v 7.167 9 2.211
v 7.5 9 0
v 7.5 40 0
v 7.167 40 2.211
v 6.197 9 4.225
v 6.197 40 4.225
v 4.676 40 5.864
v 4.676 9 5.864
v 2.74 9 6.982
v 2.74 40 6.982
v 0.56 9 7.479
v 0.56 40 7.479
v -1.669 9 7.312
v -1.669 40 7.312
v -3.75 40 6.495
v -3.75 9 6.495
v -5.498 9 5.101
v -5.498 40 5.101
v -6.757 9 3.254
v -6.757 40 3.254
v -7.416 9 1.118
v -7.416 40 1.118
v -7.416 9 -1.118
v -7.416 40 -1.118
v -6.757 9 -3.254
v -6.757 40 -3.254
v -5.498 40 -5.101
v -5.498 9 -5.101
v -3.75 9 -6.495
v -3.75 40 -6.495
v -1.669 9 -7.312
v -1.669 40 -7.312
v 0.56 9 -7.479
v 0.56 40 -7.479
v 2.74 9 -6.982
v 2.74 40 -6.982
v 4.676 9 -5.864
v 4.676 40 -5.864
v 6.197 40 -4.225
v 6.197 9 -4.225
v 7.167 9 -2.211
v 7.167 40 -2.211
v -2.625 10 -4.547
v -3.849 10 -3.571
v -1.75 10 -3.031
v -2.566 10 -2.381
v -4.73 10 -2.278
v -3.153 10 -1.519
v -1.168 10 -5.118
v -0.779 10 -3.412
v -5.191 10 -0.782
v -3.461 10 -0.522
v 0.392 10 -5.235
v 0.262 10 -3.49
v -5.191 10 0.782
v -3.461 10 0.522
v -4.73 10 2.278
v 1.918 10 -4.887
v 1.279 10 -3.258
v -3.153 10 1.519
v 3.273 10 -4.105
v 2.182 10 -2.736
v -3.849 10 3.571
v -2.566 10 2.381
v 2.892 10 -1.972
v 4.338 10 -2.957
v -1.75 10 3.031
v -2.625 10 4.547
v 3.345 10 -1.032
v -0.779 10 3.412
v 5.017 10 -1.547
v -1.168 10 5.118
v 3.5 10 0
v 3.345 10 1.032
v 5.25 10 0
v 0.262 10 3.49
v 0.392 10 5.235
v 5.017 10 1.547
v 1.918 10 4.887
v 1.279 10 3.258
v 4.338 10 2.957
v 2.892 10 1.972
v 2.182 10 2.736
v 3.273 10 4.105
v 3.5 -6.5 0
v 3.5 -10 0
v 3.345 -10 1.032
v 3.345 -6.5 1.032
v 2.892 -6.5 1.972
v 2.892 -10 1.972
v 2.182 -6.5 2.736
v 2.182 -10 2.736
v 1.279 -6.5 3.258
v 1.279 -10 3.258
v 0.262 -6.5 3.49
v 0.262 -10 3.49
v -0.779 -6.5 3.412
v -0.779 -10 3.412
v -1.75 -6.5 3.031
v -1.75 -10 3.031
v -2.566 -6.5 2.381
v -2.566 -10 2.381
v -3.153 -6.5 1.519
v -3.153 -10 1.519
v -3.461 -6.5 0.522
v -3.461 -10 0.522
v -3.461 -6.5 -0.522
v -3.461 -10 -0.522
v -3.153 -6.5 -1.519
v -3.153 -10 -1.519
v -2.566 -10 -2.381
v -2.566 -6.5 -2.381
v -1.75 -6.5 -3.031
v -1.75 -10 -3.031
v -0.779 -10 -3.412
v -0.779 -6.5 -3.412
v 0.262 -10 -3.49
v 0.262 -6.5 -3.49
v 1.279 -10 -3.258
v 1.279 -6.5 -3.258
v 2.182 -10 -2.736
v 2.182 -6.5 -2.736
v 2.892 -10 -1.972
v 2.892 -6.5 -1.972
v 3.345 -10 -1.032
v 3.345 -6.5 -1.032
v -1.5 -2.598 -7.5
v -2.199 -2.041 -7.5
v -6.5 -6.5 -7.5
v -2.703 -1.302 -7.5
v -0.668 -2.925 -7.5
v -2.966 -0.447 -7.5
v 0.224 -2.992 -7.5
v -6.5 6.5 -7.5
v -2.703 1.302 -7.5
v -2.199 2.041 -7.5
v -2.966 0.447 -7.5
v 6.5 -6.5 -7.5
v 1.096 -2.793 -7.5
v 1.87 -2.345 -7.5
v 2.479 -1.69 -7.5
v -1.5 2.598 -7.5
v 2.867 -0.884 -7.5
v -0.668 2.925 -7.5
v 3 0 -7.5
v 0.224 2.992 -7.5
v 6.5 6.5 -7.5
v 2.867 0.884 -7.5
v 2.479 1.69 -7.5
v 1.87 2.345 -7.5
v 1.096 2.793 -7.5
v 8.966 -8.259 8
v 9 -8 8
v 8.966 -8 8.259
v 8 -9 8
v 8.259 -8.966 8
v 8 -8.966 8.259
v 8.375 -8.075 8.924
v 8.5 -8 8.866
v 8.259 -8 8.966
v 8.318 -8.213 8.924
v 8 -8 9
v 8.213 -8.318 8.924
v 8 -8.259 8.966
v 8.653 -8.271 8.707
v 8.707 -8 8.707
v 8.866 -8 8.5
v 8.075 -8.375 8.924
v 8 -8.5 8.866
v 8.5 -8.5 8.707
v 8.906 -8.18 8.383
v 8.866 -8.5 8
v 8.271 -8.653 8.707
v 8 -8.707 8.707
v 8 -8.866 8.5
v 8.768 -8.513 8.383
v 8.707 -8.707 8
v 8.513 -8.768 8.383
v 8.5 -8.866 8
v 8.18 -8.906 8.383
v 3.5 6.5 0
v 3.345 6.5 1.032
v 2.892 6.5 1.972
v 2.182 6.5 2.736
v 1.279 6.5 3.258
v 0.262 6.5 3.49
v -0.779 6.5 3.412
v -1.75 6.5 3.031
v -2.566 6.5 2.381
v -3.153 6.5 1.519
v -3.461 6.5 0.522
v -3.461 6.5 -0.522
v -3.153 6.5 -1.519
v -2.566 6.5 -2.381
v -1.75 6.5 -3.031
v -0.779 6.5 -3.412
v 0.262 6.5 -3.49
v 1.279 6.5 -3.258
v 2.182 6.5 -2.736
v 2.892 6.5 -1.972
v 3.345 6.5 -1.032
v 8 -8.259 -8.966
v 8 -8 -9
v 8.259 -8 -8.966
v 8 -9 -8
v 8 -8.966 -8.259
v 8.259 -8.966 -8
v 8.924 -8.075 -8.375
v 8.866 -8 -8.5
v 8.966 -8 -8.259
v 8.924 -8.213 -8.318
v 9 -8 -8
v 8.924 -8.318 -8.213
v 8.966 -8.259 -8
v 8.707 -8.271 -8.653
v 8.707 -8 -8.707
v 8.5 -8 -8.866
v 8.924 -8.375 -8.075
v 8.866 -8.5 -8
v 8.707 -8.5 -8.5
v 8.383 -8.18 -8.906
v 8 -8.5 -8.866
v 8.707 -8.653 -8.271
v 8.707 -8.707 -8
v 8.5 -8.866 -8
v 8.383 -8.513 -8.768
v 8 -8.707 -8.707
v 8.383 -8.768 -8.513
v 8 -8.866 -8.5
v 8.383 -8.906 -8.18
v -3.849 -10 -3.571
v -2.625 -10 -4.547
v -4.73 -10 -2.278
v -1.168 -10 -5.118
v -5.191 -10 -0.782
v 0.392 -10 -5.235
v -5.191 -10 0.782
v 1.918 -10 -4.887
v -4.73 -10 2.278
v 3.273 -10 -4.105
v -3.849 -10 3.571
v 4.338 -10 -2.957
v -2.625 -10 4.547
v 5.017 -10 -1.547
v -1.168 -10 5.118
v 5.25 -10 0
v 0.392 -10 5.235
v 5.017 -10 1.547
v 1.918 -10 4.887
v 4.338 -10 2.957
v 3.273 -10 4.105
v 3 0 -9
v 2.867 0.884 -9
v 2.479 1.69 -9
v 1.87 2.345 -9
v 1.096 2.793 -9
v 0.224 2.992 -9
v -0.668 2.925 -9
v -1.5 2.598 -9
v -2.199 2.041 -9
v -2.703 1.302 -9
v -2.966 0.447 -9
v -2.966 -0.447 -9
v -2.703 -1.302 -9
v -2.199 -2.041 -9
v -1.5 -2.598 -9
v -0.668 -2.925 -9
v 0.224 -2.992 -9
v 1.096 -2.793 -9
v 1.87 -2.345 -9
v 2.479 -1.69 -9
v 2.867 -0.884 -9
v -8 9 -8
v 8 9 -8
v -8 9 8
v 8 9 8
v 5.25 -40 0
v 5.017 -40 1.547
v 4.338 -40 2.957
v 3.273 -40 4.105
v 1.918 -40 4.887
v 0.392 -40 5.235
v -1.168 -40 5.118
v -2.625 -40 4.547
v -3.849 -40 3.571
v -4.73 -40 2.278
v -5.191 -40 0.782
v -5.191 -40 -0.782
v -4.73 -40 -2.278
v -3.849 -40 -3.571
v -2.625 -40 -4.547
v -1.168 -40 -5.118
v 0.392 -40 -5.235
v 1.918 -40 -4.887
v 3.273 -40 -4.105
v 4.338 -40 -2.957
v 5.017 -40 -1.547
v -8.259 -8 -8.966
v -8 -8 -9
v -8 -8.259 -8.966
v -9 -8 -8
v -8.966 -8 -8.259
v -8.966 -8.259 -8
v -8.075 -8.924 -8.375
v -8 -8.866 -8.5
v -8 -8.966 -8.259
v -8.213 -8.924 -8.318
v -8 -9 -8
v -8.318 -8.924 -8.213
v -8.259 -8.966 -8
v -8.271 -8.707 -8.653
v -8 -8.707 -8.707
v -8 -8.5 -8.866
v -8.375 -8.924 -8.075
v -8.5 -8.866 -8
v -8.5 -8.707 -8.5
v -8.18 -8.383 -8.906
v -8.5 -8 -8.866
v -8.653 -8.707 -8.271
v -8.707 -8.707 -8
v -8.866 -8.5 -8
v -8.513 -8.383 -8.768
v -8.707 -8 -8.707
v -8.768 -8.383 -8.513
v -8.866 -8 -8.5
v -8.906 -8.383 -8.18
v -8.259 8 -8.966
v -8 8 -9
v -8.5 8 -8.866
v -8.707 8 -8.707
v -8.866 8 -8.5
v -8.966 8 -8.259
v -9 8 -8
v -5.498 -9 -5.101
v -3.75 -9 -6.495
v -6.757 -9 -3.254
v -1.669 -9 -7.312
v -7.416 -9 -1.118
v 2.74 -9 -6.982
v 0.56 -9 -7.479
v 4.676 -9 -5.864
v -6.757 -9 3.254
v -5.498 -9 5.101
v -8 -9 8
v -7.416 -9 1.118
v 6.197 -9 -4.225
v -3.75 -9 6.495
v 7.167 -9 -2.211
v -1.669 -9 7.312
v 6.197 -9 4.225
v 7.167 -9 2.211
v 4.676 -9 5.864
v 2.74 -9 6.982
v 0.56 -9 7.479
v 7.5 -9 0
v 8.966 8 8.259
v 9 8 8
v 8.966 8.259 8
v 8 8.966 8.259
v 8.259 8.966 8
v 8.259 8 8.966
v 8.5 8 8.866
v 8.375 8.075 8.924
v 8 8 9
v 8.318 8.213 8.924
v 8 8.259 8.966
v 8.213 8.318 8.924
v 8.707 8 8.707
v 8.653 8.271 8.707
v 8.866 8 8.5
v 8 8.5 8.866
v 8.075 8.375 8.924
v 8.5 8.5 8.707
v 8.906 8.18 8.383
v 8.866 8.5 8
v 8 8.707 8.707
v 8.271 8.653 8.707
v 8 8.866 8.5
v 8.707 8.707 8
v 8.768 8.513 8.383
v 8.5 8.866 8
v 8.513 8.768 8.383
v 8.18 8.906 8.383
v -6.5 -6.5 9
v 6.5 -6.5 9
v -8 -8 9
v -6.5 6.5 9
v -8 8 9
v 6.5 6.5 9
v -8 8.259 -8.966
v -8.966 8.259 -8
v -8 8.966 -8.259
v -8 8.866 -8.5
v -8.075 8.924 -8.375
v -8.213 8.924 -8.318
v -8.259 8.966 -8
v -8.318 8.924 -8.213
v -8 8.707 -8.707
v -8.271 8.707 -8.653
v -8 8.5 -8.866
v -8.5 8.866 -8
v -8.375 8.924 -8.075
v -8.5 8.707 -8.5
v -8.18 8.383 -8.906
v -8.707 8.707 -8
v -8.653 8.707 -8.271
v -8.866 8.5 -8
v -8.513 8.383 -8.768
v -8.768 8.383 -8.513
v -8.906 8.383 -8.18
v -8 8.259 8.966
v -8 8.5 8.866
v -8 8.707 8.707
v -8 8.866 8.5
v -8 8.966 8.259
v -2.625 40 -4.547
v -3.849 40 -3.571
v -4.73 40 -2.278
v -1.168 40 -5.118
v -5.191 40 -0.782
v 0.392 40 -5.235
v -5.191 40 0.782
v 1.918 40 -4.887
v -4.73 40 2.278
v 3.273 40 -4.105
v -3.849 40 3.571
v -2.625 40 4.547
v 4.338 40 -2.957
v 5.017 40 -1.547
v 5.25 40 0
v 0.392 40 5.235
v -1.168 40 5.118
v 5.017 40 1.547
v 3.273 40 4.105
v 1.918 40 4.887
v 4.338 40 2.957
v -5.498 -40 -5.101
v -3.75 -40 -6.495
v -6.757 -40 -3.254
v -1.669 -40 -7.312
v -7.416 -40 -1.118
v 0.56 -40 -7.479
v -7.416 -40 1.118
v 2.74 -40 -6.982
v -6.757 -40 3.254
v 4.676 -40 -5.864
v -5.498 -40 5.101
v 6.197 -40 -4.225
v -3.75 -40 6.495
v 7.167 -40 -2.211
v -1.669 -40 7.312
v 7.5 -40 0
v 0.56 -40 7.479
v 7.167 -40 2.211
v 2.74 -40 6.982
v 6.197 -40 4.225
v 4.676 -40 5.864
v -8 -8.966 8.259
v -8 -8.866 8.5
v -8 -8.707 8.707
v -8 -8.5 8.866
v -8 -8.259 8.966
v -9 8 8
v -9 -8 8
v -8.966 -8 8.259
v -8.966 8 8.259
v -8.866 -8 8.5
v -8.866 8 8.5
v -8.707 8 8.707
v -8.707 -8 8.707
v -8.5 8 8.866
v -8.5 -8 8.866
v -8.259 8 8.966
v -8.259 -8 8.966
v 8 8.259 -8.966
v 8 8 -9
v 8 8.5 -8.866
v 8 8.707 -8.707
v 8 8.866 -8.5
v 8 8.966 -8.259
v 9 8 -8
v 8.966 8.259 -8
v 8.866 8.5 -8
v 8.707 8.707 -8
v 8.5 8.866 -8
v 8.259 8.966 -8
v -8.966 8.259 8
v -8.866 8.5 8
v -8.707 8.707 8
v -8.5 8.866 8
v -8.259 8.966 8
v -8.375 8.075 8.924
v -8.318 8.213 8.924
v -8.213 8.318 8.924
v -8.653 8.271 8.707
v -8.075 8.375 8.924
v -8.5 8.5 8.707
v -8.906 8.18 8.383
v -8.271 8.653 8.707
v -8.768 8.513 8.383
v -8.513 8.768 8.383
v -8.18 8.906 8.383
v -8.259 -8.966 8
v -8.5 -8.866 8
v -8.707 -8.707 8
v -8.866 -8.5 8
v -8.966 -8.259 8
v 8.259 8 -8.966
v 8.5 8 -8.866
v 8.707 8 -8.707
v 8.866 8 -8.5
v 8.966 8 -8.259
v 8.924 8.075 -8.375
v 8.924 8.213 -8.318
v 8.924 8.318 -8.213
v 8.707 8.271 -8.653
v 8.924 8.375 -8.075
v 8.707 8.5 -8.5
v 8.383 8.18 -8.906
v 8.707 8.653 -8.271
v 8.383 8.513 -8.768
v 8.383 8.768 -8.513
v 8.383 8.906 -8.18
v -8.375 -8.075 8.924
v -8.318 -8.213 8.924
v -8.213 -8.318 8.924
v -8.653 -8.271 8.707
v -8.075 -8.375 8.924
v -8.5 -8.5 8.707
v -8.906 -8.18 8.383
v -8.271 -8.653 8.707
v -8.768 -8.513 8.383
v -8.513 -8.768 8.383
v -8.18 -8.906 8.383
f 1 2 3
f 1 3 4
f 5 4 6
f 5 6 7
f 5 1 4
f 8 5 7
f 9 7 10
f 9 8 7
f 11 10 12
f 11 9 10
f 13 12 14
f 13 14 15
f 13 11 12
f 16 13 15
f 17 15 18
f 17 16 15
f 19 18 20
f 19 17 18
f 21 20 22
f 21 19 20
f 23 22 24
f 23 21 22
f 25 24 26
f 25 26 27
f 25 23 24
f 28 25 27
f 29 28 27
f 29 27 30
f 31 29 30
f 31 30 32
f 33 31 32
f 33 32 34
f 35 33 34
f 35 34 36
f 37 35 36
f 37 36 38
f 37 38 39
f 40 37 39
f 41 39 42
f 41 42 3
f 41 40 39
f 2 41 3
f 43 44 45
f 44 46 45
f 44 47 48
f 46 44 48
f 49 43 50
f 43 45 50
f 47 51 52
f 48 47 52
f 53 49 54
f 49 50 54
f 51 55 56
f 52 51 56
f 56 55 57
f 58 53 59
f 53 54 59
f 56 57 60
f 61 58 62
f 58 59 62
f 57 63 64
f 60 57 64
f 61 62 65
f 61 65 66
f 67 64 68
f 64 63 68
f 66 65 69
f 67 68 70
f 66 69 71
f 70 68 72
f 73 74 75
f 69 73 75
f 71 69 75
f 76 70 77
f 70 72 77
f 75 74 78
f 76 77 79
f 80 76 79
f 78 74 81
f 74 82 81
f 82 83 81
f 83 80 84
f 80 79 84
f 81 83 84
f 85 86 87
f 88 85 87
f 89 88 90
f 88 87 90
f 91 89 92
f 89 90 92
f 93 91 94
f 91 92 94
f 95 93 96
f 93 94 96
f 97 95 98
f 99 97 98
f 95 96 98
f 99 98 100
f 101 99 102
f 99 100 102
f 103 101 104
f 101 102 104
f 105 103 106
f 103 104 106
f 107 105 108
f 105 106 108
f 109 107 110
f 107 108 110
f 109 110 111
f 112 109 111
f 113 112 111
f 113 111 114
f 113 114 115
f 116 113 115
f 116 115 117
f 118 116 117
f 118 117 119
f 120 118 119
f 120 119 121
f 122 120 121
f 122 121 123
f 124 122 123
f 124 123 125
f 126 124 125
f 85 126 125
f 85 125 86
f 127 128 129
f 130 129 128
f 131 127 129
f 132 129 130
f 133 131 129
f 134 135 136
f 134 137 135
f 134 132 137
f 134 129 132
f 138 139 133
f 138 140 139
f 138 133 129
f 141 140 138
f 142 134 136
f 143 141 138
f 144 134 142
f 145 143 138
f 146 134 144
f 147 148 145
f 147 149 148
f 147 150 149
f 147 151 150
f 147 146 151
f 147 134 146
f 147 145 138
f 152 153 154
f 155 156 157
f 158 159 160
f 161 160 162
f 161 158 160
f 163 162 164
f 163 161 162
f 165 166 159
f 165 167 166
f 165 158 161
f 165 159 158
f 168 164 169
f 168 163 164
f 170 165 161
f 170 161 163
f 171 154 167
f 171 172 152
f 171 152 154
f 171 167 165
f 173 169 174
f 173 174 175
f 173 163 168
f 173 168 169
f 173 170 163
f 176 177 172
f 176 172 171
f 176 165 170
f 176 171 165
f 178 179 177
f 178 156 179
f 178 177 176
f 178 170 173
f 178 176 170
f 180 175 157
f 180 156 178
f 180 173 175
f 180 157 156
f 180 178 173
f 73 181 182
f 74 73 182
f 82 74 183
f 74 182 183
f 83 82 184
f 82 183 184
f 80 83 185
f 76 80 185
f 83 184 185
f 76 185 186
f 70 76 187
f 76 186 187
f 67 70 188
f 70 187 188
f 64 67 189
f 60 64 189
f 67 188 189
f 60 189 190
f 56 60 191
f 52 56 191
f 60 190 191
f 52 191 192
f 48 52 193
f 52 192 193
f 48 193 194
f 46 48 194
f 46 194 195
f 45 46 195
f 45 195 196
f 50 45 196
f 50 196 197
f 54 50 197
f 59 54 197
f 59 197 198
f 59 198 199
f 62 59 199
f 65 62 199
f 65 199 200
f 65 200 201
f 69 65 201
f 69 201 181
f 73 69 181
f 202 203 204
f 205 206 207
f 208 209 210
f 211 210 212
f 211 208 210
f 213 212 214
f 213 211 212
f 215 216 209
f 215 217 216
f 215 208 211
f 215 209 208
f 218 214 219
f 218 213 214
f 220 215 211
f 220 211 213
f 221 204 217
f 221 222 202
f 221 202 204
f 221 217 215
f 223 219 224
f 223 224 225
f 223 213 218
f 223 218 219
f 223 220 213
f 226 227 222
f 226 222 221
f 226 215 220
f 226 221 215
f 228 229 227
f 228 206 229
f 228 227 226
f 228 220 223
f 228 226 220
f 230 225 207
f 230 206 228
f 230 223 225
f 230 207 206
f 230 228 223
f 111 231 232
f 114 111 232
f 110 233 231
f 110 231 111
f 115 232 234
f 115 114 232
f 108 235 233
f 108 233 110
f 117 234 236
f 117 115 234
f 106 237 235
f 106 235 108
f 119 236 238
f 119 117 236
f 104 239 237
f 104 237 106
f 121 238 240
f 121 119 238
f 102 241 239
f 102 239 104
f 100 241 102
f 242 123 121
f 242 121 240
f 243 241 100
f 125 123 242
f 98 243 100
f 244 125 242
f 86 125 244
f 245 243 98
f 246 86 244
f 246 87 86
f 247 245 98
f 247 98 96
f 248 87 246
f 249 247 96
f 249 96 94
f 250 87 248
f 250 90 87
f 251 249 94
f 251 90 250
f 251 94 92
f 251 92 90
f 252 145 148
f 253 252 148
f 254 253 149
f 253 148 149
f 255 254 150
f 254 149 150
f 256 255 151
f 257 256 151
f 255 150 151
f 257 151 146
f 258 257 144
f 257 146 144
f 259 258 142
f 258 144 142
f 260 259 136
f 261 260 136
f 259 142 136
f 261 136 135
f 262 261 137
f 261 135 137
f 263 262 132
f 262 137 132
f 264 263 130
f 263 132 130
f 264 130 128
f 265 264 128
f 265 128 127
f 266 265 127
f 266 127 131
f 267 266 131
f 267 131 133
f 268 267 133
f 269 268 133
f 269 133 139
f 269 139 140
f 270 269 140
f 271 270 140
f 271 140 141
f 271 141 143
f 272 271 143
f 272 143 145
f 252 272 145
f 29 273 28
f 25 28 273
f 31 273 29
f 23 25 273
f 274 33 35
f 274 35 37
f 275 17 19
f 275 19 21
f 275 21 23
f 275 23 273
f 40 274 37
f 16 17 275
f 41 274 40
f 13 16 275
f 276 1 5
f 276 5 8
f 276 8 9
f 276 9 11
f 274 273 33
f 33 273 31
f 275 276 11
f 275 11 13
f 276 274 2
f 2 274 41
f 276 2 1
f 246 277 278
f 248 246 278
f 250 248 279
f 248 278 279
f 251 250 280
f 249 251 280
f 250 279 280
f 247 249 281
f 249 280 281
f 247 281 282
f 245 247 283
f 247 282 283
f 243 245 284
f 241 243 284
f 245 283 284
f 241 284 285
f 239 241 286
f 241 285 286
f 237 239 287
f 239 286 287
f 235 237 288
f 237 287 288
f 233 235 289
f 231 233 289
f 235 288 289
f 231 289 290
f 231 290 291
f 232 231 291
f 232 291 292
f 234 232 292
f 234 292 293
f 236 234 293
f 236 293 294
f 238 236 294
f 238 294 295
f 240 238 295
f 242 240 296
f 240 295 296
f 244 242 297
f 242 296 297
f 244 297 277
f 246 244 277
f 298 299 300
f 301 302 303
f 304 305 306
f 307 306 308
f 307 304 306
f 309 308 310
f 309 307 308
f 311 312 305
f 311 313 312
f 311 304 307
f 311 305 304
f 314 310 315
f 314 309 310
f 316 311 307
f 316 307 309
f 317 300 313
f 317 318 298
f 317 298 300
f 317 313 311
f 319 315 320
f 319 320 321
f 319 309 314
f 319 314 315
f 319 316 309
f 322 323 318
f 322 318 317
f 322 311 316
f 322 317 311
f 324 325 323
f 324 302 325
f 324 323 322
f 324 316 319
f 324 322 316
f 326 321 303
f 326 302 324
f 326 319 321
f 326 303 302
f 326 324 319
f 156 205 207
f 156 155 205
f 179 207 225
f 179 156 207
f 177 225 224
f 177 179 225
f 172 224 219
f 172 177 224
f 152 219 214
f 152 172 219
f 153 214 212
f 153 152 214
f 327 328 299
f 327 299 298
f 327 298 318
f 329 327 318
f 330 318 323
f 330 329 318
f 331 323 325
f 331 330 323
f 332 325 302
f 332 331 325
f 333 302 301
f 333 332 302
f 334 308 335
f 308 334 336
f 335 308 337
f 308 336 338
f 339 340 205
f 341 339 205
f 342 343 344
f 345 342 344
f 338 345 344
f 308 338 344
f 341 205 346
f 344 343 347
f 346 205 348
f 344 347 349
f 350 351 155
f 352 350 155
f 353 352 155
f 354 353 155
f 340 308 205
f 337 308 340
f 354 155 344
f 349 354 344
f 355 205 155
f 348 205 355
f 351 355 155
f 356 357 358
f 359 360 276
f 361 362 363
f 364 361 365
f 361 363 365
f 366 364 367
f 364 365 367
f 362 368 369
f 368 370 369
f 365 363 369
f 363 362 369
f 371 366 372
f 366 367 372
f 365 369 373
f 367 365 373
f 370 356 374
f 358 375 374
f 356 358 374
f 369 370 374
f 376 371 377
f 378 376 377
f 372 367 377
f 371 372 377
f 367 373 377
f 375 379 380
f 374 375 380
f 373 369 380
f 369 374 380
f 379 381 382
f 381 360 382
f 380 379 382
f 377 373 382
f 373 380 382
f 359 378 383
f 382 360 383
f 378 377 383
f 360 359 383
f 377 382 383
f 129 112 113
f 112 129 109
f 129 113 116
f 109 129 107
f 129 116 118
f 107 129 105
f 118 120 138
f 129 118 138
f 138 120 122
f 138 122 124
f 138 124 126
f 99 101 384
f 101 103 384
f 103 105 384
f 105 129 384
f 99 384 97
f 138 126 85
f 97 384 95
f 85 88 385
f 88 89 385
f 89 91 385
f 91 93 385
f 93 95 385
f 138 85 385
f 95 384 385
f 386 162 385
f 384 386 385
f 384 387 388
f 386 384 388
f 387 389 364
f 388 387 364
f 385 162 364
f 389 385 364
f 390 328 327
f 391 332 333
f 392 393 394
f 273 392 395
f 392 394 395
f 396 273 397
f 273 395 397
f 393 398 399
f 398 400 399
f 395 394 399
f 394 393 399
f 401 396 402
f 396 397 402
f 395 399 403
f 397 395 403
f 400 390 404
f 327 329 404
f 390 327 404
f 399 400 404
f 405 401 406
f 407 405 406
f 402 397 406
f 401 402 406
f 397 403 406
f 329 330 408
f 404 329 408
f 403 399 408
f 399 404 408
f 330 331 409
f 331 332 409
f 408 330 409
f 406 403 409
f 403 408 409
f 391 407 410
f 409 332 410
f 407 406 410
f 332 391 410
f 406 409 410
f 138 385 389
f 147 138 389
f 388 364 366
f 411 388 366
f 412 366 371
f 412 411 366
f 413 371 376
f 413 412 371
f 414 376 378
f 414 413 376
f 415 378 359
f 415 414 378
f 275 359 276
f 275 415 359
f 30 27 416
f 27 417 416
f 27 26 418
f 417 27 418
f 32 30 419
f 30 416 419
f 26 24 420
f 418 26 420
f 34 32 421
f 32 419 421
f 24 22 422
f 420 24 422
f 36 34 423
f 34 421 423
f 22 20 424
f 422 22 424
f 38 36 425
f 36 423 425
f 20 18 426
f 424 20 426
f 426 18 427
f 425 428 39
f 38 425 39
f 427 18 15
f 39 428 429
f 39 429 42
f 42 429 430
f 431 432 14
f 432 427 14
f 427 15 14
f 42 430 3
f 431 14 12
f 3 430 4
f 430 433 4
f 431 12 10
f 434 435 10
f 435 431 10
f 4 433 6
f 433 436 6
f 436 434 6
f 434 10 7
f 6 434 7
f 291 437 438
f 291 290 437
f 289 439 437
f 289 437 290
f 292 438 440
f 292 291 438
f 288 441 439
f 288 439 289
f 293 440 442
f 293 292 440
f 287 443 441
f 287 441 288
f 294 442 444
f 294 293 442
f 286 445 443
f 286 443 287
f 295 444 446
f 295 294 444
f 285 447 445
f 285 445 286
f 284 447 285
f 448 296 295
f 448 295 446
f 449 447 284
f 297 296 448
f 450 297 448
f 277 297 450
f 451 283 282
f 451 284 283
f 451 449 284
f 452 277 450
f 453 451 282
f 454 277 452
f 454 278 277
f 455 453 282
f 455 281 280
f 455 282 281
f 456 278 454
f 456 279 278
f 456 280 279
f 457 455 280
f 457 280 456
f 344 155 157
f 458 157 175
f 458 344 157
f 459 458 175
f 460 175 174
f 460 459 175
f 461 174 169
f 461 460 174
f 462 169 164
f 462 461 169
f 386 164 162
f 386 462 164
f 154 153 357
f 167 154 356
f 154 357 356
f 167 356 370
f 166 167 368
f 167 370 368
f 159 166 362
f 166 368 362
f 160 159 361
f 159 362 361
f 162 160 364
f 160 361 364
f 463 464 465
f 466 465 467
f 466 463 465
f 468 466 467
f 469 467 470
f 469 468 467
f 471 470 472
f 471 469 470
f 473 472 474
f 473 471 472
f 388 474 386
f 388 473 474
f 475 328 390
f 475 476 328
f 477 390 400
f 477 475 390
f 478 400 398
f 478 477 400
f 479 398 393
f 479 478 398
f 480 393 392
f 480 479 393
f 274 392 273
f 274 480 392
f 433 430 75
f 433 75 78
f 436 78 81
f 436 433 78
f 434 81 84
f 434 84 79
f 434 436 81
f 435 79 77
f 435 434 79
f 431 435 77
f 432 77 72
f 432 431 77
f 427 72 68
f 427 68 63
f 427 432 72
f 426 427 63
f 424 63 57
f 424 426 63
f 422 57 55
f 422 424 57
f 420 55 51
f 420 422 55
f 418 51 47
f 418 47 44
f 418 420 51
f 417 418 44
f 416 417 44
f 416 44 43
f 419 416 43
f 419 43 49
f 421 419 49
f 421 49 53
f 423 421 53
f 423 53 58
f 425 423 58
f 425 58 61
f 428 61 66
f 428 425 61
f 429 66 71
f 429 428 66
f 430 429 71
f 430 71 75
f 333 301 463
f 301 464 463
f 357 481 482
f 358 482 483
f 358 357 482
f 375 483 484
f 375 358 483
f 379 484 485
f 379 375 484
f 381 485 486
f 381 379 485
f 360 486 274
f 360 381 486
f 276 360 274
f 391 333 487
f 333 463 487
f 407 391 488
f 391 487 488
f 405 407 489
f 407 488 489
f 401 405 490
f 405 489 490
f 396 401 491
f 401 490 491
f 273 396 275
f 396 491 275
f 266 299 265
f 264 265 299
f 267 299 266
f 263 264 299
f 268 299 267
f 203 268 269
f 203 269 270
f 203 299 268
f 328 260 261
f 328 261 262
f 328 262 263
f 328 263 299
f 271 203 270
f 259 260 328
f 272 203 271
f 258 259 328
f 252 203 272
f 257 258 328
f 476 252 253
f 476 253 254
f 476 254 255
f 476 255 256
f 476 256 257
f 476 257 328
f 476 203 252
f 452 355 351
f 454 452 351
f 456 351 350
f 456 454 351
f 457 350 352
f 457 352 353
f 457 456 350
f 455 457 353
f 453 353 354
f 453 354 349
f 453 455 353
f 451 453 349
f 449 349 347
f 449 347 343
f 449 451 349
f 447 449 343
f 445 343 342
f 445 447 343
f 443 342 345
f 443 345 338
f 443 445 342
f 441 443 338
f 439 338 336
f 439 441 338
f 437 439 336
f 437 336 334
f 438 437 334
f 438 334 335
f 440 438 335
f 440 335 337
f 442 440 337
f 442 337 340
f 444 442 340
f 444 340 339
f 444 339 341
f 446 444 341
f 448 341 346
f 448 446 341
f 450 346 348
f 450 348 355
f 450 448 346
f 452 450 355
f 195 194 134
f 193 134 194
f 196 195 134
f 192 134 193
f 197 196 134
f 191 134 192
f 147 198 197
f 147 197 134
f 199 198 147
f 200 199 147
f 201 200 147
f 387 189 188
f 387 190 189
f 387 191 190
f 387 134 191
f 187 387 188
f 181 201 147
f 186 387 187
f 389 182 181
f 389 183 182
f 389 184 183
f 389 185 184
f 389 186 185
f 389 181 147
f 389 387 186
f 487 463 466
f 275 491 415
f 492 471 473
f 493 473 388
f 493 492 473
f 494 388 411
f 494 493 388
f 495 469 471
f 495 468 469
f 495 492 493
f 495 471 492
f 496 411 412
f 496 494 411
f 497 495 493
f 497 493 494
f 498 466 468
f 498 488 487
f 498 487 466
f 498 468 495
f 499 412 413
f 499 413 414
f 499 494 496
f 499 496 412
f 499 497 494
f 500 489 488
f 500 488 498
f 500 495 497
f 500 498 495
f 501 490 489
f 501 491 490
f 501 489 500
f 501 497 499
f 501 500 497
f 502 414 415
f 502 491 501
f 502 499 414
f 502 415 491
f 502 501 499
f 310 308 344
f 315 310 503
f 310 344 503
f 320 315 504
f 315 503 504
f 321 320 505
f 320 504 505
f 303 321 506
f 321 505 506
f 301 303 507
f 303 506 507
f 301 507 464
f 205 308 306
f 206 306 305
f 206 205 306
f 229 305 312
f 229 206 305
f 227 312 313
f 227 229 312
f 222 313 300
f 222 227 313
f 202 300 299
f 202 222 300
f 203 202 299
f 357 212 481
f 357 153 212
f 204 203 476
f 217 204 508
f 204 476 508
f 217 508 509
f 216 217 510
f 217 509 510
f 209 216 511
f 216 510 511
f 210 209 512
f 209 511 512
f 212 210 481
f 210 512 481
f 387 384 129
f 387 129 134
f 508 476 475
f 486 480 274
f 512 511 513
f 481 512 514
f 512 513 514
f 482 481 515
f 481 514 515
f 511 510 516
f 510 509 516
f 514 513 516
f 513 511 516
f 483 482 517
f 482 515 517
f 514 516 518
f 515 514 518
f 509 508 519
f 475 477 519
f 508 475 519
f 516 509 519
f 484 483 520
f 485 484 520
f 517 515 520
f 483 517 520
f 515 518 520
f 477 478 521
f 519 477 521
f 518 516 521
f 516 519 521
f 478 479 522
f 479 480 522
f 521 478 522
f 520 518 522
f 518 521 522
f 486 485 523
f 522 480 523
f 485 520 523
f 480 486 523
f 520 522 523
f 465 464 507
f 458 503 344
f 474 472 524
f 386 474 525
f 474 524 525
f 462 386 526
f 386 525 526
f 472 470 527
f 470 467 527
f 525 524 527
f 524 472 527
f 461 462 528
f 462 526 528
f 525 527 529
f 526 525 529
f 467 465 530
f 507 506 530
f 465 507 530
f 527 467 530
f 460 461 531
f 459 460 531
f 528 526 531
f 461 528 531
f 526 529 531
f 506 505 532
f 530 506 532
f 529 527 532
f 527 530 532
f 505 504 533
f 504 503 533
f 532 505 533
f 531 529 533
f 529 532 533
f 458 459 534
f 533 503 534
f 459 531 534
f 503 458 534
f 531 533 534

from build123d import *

# Parameters (mm, degrees)
SKETCH_R             = 7.5
PAD_DEPTH            = 40
SKETCH001_R          = 5.25
POCKET_DEPTH         = 30
SKETCH002_R          = 5.25
POCKET001_DEPTH      = 30
SKETCH004_W          = 18
SKETCH004_H          = 18
PAD001_DEPTH         = 9
SKETCH005_R          = 3.5
POCKET002_DEPTH      = 40.001
POCKET002_DEPTH_BACK = 40.001
SKETCH006_R          = 3
POCKET003_DEPTH      = 9.001
POCKET003_DEPTH_BACK = 9.001
SKETCH008_W          = 13
SKETCH008_H          = 13
POCKET004_DEPTH      = 16.5
FILLET_R             = 1


with BuildPart() as part:
    # Sketch → Pad (new body, symmetric)
    with BuildSketch(Plane.XZ):
        Circle(SKETCH_R)
    extrude(amount=PAD_DEPTH, both=True)

    # Sketch001 → Pocket (cut)
    with BuildSketch(Plane.XZ.offset(40)):
        Circle(SKETCH001_R)
    extrude(amount=-POCKET_DEPTH, mode=Mode.SUBTRACT)

    # Sketch002 → Pocket001 (cut)
    with BuildSketch(Plane.XZ.offset(-40)):
        Circle(SKETCH002_R)
    extrude(amount=POCKET001_DEPTH, mode=Mode.SUBTRACT)

    # Sketch004 → Pad001 (join, symmetric)
    with BuildSketch(Plane.YZ):
        Rectangle(SKETCH004_W, SKETCH004_H)
    extrude(amount=PAD001_DEPTH, both=True)

    # Sketch005 → Pocket002 (cut, two sides)
    with BuildSketch(Plane.XZ) as pocket002_sk:
        Circle(SKETCH005_R)
    extrude(amount=-POCKET002_DEPTH, mode=Mode.SUBTRACT)
    extrude(pocket002_sk.sketch, amount=POCKET002_DEPTH_BACK, mode=Mode.SUBTRACT)

    # Sketch006 → Pocket003 (cut, two sides)
    with BuildSketch(Plane.XY) as pocket003_sk:
        Circle(SKETCH006_R)
    extrude(amount=-POCKET003_DEPTH, mode=Mode.SUBTRACT)
    extrude(pocket003_sk.sketch, amount=POCKET003_DEPTH_BACK, mode=Mode.SUBTRACT)

    # Sketch008 → Pocket004 (cut)
    with BuildSketch(Plane.XY.offset(9)):
        Rectangle(SKETCH008_W, SKETCH008_H)
    extrude(amount=-POCKET004_DEPTH, mode=Mode.SUBTRACT)

    # Fillet
    fillet_edges = [part.edges().sort_by_distance(p)[0] for p in [
        (-9, 0, -9),
        (0, -9, -9),
        (0, 9, -9),
        (9, 0, -9),
        (9, 9, 0),
        (9, -9, 0),
        (9, 0, 9),
        (-9, 9, 0),
        (-9, -9, 0),
        (-9, 0, 9),
        (0, 9, 9),
        (0, -9, 9),
    ]]
    fillet(fillet_edges, radius=FILLET_R)


solid = part.part
